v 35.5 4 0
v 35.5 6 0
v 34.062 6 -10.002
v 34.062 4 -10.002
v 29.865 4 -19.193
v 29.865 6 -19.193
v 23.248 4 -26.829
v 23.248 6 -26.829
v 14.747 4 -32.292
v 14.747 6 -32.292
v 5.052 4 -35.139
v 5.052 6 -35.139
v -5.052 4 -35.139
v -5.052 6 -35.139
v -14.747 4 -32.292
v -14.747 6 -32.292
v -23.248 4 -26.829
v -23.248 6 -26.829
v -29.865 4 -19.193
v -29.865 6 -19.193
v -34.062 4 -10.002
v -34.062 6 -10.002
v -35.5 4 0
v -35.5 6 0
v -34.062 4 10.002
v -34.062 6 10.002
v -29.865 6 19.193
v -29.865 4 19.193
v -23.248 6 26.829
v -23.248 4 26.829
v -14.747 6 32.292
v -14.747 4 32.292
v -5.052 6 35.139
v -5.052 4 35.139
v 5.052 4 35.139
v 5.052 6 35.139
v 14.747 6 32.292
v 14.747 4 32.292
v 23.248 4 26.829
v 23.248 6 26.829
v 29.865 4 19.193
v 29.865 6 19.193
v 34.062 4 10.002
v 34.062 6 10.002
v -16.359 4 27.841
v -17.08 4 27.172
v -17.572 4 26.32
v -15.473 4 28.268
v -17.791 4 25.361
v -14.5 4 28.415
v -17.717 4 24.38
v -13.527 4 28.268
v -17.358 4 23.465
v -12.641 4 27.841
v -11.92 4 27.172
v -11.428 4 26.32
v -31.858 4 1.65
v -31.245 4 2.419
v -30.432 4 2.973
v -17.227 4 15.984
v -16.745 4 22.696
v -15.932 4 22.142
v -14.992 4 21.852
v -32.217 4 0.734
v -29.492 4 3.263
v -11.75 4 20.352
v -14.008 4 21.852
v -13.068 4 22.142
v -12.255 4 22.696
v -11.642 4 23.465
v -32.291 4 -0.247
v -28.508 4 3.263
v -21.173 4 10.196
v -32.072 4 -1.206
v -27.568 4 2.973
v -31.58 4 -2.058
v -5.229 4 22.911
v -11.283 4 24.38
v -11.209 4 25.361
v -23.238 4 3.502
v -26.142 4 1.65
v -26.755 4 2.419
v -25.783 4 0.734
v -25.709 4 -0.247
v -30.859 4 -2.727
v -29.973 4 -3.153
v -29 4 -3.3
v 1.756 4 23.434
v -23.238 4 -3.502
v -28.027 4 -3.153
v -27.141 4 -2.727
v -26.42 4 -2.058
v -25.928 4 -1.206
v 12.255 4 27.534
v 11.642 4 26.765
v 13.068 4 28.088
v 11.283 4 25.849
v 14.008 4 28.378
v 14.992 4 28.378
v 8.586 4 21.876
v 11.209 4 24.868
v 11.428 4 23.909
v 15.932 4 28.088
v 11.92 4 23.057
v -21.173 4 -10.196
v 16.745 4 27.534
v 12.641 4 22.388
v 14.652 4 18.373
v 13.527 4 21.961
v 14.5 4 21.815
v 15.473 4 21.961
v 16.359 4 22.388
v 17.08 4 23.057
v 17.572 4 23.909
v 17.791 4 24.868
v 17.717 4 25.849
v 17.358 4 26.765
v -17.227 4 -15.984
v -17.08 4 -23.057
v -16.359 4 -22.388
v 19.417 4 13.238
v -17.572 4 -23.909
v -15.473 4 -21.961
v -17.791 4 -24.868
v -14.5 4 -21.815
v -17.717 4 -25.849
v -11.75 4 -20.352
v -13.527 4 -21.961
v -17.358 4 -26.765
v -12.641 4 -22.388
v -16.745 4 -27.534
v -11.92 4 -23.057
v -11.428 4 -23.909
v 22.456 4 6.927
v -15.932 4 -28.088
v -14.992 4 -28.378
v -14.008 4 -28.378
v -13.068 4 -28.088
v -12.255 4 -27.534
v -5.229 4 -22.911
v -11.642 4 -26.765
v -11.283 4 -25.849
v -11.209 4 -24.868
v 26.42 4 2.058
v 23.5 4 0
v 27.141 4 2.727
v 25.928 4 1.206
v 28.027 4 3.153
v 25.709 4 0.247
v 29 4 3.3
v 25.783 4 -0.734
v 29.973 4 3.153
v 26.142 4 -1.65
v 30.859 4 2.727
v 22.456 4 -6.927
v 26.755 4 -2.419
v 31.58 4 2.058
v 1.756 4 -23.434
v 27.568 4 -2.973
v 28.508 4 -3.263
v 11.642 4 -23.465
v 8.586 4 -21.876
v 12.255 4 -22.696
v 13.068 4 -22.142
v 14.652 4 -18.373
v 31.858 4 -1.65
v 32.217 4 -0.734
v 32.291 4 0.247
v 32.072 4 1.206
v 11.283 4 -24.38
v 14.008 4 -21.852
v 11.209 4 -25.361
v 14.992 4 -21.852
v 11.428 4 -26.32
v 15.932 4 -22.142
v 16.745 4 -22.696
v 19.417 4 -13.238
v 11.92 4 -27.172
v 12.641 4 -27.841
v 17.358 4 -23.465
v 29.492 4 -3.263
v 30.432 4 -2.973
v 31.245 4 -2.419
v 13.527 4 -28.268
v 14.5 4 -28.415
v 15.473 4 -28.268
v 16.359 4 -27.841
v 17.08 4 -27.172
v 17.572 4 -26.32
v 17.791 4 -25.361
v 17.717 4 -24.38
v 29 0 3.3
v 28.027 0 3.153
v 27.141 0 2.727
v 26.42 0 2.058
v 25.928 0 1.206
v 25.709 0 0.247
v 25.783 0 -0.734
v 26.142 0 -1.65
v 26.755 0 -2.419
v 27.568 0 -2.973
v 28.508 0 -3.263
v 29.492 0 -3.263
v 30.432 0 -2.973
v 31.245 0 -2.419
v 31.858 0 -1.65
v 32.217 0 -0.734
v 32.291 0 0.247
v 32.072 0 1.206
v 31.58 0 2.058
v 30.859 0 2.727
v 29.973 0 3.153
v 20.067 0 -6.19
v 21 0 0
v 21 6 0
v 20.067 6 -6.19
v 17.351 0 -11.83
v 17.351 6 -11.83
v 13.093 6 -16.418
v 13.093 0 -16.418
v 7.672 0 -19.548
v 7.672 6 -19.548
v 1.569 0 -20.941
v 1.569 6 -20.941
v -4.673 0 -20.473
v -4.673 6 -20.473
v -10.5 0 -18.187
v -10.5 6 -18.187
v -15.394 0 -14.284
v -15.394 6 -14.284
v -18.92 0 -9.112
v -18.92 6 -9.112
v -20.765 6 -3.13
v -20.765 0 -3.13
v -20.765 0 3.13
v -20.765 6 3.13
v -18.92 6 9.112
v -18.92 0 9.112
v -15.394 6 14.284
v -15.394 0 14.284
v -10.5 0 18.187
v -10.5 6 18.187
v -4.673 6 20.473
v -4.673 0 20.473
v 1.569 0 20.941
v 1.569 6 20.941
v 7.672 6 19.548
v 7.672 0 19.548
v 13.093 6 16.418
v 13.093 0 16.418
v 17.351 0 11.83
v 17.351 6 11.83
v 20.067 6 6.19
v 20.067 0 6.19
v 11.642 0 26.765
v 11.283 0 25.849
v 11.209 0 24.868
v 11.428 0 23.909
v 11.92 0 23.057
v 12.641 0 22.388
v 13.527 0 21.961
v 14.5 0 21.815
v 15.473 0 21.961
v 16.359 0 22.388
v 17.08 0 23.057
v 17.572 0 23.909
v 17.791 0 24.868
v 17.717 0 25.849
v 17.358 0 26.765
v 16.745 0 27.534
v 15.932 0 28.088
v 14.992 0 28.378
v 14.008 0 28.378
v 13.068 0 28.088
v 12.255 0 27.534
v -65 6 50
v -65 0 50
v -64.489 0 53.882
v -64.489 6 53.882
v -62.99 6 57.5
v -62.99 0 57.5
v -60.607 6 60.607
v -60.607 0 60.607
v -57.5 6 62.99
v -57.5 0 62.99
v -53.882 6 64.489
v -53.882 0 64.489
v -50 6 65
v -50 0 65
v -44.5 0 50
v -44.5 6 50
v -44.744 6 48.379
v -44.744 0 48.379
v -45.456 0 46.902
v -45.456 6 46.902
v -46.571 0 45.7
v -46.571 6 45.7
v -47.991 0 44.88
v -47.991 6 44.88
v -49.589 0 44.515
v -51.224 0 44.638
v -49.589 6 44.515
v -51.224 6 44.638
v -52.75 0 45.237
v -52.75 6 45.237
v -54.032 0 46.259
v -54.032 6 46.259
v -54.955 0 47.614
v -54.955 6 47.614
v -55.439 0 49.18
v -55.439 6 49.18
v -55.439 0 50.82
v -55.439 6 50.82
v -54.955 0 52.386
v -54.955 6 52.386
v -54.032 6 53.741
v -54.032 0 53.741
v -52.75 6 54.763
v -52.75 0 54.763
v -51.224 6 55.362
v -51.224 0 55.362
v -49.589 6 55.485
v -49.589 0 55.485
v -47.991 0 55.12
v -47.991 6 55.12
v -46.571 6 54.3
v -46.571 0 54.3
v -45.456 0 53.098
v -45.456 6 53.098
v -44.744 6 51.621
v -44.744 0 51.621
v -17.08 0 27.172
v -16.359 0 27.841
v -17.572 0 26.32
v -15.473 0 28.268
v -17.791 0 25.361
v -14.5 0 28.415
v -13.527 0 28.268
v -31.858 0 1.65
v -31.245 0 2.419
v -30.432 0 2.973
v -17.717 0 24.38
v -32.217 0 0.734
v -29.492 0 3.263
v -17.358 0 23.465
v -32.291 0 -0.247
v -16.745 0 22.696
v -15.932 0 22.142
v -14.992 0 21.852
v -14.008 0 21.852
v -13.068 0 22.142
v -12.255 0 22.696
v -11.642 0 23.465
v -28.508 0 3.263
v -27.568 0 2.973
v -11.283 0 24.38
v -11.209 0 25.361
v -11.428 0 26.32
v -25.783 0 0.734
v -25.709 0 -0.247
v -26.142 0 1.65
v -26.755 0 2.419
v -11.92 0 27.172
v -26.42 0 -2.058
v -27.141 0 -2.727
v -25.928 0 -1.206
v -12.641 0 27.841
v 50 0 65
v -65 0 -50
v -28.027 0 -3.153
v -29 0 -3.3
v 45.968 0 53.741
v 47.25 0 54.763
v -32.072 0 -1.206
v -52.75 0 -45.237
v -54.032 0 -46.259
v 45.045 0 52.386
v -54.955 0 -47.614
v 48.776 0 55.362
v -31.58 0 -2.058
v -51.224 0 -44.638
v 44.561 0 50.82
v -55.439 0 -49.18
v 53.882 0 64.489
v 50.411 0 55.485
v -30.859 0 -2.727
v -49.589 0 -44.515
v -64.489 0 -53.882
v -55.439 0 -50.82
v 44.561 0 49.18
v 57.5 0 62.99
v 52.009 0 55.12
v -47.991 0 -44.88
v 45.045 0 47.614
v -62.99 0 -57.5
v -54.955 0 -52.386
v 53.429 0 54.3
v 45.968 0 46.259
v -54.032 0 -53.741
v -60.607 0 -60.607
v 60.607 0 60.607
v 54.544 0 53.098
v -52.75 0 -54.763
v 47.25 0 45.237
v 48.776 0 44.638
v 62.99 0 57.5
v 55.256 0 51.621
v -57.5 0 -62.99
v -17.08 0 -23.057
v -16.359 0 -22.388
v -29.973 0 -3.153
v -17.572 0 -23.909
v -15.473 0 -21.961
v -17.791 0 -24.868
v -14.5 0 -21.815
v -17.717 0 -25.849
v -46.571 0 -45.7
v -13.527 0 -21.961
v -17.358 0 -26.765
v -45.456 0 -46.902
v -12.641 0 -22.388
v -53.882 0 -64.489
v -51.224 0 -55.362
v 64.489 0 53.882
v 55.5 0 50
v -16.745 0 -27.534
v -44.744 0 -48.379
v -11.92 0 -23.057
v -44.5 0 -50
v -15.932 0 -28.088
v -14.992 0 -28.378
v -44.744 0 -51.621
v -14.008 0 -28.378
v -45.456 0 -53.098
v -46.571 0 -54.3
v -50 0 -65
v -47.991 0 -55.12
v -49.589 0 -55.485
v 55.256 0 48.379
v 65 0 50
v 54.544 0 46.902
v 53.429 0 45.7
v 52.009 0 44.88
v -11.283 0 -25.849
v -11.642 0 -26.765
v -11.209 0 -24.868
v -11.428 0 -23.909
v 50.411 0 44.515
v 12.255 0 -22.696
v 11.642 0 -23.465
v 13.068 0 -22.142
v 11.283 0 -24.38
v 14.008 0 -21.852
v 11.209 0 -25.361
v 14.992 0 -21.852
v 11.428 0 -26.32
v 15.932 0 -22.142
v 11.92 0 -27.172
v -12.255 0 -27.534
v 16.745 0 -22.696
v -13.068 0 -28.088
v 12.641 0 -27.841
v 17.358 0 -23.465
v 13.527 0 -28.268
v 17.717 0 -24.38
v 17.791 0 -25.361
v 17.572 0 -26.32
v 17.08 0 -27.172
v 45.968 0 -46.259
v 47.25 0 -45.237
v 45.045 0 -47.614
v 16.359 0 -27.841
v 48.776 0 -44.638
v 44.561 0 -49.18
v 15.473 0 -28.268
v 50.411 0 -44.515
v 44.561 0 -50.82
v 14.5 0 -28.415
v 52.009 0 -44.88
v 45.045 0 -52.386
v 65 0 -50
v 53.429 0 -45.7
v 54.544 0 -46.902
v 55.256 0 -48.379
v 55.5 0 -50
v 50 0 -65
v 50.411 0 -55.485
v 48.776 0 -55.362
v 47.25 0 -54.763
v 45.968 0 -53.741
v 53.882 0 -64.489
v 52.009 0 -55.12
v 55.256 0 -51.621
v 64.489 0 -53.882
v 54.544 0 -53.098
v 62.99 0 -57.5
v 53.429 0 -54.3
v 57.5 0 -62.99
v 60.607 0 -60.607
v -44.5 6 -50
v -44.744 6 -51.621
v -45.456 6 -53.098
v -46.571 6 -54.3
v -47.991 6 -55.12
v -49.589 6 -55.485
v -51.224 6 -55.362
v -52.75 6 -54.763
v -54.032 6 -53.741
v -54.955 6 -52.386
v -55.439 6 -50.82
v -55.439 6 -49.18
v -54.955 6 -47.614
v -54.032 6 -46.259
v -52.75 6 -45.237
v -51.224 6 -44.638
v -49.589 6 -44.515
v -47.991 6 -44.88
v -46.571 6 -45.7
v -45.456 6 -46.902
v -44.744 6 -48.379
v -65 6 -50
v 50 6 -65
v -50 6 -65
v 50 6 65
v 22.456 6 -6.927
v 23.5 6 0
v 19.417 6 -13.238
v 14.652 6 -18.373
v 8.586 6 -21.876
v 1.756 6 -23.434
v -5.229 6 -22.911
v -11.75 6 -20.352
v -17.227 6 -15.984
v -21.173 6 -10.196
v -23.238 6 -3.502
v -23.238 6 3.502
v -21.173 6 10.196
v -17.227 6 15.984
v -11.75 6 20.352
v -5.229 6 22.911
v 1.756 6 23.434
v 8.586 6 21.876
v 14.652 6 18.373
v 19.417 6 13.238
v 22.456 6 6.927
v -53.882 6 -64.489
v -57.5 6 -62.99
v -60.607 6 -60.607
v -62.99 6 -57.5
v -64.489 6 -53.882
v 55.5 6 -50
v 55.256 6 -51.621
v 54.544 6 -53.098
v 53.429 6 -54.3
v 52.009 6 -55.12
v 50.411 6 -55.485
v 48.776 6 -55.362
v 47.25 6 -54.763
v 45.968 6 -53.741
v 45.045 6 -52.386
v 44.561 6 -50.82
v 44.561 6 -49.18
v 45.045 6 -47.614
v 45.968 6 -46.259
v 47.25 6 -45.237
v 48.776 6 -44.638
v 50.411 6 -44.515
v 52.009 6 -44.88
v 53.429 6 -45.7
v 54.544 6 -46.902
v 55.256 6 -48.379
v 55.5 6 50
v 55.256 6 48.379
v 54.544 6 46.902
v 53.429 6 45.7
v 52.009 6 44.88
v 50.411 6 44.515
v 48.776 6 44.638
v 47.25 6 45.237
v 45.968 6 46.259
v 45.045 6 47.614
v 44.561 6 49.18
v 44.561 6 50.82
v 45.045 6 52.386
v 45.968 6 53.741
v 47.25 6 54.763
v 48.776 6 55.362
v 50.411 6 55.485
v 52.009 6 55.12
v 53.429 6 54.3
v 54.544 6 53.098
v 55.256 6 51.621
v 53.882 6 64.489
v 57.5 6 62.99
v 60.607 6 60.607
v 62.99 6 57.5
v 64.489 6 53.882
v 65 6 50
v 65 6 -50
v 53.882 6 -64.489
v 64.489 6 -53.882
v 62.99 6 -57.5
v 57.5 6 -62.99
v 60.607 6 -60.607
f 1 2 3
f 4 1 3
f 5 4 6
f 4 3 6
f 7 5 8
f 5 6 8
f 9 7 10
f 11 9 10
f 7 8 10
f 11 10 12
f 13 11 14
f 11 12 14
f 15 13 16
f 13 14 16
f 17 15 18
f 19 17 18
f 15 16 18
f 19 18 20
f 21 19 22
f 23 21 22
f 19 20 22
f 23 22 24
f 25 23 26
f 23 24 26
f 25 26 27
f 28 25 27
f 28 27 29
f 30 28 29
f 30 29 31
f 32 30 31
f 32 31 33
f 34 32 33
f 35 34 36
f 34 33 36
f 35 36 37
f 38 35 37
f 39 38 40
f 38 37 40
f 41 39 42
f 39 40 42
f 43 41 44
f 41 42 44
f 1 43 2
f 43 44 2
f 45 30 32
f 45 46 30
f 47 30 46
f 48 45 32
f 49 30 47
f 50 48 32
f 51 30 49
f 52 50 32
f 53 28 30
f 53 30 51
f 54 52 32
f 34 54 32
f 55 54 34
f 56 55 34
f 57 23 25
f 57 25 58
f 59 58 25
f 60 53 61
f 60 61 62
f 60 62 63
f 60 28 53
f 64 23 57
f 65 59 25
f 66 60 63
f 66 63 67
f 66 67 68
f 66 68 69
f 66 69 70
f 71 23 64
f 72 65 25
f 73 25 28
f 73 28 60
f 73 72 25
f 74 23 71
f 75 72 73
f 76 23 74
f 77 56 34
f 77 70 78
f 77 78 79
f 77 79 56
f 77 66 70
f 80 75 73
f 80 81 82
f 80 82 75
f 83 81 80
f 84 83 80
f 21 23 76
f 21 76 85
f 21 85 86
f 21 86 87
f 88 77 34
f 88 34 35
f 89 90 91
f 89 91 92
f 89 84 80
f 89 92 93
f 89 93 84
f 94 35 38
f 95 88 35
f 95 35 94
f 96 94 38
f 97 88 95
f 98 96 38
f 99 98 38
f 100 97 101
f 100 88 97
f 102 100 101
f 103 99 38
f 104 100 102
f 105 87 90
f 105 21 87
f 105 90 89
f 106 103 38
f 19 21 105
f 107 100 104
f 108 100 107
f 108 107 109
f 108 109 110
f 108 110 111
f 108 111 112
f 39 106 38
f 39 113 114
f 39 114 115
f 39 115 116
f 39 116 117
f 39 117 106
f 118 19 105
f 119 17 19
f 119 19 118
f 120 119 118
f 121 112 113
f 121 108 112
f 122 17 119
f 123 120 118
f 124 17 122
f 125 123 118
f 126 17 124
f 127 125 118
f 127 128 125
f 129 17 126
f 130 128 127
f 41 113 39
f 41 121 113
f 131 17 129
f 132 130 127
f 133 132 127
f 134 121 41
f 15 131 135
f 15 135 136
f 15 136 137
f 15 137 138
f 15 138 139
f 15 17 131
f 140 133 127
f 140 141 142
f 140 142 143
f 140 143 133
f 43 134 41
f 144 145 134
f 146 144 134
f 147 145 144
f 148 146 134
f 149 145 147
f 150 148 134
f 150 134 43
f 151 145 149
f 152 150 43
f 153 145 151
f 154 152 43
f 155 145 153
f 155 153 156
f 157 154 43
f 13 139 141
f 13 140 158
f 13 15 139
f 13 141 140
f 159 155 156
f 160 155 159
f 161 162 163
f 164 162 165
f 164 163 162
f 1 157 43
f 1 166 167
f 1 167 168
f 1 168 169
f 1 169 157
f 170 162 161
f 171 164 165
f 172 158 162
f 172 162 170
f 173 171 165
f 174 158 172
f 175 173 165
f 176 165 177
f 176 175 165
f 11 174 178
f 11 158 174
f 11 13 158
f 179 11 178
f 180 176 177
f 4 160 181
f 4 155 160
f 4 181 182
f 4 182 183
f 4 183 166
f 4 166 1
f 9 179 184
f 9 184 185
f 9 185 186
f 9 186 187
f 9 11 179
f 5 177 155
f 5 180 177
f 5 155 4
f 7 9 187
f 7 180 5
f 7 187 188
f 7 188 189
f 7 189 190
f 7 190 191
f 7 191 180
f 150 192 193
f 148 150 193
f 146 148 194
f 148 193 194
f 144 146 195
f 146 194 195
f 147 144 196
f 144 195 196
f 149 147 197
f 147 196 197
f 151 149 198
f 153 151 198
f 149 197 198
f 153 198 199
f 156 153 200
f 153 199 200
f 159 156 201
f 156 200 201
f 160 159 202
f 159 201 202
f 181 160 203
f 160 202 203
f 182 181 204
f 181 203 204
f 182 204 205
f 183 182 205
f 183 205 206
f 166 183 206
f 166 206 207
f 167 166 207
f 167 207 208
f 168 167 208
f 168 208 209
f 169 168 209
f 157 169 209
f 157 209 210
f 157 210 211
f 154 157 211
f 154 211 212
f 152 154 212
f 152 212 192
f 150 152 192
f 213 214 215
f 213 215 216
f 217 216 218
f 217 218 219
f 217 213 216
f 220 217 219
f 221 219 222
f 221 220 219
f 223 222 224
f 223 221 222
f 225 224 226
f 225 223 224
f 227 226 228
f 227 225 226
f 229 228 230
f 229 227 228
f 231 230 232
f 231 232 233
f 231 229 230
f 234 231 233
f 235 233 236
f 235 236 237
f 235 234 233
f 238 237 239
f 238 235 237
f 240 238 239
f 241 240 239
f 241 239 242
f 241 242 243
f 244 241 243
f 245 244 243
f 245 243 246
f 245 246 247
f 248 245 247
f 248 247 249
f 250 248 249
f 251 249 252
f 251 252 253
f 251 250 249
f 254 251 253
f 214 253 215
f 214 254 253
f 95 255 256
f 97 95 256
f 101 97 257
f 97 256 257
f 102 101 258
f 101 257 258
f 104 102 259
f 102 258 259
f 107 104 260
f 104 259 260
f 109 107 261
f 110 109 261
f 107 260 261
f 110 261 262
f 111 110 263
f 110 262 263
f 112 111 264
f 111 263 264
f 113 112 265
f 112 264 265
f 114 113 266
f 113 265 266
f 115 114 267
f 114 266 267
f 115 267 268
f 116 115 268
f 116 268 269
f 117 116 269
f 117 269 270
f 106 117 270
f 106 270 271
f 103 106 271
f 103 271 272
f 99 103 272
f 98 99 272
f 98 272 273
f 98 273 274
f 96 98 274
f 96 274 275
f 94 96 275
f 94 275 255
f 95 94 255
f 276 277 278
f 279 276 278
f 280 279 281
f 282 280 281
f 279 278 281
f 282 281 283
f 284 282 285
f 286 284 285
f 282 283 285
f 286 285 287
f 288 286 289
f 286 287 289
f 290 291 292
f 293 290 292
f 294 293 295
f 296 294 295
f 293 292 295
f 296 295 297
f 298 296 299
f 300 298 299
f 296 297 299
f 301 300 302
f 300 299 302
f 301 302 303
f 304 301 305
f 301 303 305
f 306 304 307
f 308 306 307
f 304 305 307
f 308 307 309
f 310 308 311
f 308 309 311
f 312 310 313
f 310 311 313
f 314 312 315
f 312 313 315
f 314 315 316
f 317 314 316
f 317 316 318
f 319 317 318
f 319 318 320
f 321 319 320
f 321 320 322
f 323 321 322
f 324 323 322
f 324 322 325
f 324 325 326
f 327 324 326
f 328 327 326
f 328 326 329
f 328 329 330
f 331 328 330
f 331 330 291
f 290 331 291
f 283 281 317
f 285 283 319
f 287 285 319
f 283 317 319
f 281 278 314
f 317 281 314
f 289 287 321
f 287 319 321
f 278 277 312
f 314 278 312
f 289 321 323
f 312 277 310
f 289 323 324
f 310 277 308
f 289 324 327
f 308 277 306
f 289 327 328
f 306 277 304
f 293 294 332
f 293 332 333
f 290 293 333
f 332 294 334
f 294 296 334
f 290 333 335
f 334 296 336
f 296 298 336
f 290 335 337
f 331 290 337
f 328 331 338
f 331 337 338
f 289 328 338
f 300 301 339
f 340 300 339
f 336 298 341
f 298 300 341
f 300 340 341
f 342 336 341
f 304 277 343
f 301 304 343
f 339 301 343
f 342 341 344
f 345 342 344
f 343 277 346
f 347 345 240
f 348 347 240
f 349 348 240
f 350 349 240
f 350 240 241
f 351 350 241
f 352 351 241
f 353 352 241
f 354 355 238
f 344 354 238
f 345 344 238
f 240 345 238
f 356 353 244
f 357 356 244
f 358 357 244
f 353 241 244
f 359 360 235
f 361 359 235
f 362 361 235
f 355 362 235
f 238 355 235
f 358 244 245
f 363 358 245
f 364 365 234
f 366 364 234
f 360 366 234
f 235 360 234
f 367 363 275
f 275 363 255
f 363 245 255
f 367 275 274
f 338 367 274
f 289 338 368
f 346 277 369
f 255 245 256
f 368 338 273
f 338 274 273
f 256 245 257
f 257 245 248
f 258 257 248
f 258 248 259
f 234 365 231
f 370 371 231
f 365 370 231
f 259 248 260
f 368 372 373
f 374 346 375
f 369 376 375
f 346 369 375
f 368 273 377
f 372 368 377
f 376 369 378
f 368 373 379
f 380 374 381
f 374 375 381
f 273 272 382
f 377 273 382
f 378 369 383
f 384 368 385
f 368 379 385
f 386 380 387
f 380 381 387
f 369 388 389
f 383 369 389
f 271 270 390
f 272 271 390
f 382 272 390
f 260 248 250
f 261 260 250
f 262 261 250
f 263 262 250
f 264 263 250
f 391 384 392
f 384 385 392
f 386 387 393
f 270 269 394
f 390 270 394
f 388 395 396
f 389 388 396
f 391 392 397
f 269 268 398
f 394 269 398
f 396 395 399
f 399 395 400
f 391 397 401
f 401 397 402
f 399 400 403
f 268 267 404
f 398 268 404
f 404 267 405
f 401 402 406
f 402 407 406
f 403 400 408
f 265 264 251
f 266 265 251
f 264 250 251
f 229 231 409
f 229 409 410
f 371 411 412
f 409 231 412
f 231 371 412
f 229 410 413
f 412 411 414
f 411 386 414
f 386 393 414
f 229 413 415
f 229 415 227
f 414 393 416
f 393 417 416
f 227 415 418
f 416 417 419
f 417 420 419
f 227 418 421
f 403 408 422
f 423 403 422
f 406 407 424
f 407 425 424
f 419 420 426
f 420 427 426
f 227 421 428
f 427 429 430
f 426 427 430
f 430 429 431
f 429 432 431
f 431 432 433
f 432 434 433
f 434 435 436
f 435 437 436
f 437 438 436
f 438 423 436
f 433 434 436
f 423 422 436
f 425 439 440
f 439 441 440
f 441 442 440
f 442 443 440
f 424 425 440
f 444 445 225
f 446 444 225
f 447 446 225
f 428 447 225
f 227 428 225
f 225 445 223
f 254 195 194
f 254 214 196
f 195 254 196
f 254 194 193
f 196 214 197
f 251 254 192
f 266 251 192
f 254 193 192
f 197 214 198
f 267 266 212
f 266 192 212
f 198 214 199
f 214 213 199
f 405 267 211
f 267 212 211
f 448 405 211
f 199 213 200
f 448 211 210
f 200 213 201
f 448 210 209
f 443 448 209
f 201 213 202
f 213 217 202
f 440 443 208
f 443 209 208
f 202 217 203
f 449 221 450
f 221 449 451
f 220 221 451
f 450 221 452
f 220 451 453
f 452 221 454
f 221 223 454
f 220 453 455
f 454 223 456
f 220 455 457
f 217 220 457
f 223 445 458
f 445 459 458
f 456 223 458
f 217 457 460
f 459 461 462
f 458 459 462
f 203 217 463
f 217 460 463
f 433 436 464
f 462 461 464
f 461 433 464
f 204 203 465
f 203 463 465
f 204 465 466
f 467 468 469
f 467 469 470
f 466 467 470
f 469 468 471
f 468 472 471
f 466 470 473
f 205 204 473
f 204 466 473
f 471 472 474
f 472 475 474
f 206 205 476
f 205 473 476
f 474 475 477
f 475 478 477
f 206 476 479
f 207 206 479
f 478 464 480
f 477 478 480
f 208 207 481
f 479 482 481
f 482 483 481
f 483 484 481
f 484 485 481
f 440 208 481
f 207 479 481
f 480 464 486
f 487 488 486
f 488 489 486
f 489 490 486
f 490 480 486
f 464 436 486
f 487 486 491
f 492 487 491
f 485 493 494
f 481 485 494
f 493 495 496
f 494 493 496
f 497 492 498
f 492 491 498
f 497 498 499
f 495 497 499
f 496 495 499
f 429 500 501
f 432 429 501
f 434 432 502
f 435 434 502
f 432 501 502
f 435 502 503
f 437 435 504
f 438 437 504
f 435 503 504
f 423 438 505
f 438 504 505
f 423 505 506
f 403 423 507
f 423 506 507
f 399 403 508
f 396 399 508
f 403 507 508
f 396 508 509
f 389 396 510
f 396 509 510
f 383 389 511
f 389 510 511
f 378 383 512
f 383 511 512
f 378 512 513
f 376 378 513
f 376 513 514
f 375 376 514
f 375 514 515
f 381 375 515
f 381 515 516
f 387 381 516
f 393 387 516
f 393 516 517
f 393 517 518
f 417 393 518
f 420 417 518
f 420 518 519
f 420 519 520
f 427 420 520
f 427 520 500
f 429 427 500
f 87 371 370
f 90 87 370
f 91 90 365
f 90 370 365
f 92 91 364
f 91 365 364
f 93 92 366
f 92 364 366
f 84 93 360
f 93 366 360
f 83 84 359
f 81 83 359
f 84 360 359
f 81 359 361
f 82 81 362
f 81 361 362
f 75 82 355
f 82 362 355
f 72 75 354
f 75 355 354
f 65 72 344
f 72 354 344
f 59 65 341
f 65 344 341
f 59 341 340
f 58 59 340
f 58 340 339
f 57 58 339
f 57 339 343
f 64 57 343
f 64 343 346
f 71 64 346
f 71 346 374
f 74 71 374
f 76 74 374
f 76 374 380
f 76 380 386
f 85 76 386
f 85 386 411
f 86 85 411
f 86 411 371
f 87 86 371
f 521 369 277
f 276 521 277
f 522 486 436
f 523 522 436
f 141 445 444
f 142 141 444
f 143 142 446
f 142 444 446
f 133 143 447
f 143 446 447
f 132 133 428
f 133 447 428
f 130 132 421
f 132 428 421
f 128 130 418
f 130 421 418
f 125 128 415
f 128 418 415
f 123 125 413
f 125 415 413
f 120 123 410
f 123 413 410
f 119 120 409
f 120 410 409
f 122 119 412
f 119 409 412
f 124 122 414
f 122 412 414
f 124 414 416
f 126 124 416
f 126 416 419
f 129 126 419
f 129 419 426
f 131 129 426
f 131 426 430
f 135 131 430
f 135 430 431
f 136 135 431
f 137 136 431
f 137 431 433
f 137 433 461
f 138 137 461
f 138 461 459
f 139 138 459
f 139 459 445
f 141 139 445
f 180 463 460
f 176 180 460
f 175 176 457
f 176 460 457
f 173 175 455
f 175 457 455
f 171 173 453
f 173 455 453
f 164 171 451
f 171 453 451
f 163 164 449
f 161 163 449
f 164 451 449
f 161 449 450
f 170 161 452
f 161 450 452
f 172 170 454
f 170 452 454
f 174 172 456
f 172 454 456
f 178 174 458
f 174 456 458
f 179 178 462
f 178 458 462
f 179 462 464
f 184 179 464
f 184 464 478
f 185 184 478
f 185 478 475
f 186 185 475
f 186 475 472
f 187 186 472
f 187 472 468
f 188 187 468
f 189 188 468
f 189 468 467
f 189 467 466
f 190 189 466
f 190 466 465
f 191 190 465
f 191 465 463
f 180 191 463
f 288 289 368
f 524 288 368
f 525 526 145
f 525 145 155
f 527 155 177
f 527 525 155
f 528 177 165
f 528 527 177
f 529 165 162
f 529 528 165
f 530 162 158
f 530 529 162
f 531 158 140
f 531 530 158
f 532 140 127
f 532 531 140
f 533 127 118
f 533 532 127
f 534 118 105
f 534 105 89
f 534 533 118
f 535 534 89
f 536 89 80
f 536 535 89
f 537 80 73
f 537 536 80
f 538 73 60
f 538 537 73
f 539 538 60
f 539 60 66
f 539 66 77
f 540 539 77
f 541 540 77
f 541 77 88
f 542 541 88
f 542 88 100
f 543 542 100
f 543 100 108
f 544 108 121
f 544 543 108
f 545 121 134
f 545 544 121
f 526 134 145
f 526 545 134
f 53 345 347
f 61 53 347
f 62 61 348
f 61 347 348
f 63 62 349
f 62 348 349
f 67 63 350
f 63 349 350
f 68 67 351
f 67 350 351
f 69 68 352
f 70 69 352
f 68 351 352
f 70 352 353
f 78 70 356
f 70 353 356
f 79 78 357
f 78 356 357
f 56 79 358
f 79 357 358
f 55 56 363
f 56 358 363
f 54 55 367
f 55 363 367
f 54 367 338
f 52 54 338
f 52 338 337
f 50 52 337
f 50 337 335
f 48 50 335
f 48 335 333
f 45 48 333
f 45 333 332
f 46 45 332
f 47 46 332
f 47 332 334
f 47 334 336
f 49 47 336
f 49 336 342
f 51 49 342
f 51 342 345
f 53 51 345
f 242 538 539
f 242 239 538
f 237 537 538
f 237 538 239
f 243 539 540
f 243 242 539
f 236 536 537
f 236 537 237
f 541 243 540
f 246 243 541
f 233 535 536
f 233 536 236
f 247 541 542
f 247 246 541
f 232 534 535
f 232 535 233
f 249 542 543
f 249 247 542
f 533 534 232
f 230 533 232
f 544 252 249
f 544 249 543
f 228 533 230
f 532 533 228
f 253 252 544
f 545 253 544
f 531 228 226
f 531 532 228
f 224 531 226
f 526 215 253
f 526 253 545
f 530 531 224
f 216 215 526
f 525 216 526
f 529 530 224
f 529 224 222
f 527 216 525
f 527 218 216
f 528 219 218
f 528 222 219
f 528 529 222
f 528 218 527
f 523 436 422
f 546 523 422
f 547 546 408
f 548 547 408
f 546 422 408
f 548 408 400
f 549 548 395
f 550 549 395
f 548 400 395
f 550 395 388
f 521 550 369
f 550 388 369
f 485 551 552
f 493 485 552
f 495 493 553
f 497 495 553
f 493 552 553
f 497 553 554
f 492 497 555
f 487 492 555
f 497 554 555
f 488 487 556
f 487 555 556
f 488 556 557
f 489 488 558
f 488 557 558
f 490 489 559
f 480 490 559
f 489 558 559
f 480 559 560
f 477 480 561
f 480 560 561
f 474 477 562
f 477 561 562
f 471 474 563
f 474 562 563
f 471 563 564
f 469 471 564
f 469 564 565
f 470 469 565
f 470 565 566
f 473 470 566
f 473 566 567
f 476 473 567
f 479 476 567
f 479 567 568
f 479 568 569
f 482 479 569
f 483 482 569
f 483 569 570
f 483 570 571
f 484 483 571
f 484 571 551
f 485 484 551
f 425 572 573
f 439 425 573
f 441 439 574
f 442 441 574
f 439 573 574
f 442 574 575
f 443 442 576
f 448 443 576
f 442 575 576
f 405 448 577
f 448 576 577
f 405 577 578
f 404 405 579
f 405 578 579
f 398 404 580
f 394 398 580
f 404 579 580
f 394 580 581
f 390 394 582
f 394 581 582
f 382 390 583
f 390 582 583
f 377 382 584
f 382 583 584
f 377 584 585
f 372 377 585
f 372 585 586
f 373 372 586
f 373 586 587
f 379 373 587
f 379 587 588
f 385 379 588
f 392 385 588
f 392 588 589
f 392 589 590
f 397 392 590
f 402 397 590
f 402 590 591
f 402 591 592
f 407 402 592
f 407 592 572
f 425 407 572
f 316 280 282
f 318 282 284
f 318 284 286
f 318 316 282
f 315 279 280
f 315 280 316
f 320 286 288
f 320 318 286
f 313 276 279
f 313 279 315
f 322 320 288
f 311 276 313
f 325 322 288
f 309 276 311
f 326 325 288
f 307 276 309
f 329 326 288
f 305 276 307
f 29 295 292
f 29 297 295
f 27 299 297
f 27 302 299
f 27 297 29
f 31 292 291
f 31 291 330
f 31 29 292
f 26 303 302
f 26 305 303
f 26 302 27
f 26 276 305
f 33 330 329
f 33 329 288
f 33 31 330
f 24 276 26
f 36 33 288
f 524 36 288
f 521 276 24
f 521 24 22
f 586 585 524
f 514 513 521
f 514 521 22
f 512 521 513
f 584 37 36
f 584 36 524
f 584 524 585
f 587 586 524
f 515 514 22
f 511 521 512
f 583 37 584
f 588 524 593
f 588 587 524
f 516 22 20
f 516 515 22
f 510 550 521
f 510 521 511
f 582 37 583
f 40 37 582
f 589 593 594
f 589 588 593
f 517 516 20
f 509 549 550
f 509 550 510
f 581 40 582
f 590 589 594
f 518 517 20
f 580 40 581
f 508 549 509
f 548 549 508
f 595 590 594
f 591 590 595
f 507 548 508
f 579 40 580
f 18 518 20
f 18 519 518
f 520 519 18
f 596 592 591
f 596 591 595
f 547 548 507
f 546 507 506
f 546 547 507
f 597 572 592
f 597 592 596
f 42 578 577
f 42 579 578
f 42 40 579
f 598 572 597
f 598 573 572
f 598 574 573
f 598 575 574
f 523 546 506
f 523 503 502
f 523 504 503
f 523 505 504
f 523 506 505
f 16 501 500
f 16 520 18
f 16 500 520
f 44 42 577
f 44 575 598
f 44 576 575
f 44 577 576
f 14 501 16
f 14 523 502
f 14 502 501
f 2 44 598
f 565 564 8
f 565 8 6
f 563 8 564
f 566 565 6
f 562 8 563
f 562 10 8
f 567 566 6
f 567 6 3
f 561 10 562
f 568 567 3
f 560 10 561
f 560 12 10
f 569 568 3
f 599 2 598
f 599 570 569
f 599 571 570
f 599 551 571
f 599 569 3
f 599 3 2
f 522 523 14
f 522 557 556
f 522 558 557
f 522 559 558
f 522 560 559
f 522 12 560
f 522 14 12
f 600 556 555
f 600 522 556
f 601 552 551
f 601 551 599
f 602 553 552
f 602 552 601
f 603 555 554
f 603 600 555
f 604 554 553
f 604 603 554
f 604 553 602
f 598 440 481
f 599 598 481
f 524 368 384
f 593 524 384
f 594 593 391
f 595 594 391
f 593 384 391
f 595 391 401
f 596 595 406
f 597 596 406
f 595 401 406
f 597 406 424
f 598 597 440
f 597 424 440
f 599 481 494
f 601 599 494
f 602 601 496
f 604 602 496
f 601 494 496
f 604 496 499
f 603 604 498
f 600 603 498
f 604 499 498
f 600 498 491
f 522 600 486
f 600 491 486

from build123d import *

# Parameters (mm, degrees)
SKETCH1_R                = 21
BOSS_EXTRUDE1_DEPTH      = 6
SKETCH2_R                = 35.5
SKETCH2_R_2              = 23.5
CUT_EXTRUDE1_DEPTH       = 2
SKETCH3_R                = 5.5
CUT_EXTRUDE2_DEPTH       = 1
CUT_EXTRUDE2_DEPTH_BACK  = 7
M6_CLEARANCE_HOLE1_D     = 6.6
M6_CLEARANCE_HOLE1_DEPTH = 4
CIRPATTERN1_COUNT        = 6


with BuildPart() as part:
    # Sketch1 → Boss-Extrude1 (new body)
    with BuildSketch(Plane(origin=(0, 0, 0), x_dir=(1, 0, 0), z_dir=(0, 1, 0))):
        with BuildLine():
            Line((-50, -65), (50, -65))
            ThreePointArc((50, -65), (60.606601718, -60.606601718), (65, -50))
            Line((65, -50), (65, 50))
            ThreePointArc((65, 50), (60.606601718, 60.606601718), (50, 65))
            Line((50, 65), (-50, 65))
            ThreePointArc((-50, 65), (-60.606601718, 60.606601718), (-65, 50))
            Line((-65, 50), (-65, -50))
            ThreePointArc((-65, -50), (-60.606601718, -60.606601718), (-50, -65))
        make_face()
        Circle(SKETCH1_R, mode=Mode.SUBTRACT)
    extrude(amount=BOSS_EXTRUDE1_DEPTH)

    # Sketch2 → Cut-Extrude1 (cut)
    with BuildSketch(Plane(origin=(0, 6, 0), x_dir=(1, 0, 0), z_dir=(0, 1, 0))):
        Circle(SKETCH2_R)
        Circle(SKETCH2_R_2, mode=Mode.SUBTRACT)
    extrude(amount=-CUT_EXTRUDE1_DEPTH, mode=Mode.SUBTRACT)

    # Sketch3 → Cut-Extrude2 (cut, two sides)
    with BuildSketch(Plane(origin=(0, 6, 0), x_dir=(1, 0, 0), z_dir=(0, 1, 0))) as cut_extrude2_sk:
        with Locations((-50, 50)):
            Circle(SKETCH3_R)
        with Locations((50, 50)):
            Circle(SKETCH3_R)
        with Locations((50, -50)):
            Circle(SKETCH3_R)
        with Locations((-50, -50)):
            Circle(SKETCH3_R)
    extrude(amount=CUT_EXTRUDE2_DEPTH, mode=Mode.SUBTRACT)
    extrude(cut_extrude2_sk.sketch, amount=-CUT_EXTRUDE2_DEPTH_BACK, mode=Mode.SUBTRACT)

    # M6 Clearance Hole1
    with Locations(Plane(origin=(-29, 4, 0), x_dir=(0, 0, 1), z_dir=(0, 1, 0))):
        with Locations((0, 0)):
            m6_clearance_hole1 = Hole(M6_CLEARANCE_HOLE1_D / 2, depth=M6_CLEARANCE_HOLE1_DEPTH)

    # CirPattern1: M6 Clearance Hole1 ×6 about axis
    cirpattern1_axis = Axis((0, 0, 0), (0, 1, 0))
    for i in range(1, CIRPATTERN1_COUNT):
        add(m6_clearance_hole1.rotate(cirpattern1_axis, i * 360 / CIRPATTERN1_COUNT), mode=Mode.SUBTRACT)


solid = part.part
